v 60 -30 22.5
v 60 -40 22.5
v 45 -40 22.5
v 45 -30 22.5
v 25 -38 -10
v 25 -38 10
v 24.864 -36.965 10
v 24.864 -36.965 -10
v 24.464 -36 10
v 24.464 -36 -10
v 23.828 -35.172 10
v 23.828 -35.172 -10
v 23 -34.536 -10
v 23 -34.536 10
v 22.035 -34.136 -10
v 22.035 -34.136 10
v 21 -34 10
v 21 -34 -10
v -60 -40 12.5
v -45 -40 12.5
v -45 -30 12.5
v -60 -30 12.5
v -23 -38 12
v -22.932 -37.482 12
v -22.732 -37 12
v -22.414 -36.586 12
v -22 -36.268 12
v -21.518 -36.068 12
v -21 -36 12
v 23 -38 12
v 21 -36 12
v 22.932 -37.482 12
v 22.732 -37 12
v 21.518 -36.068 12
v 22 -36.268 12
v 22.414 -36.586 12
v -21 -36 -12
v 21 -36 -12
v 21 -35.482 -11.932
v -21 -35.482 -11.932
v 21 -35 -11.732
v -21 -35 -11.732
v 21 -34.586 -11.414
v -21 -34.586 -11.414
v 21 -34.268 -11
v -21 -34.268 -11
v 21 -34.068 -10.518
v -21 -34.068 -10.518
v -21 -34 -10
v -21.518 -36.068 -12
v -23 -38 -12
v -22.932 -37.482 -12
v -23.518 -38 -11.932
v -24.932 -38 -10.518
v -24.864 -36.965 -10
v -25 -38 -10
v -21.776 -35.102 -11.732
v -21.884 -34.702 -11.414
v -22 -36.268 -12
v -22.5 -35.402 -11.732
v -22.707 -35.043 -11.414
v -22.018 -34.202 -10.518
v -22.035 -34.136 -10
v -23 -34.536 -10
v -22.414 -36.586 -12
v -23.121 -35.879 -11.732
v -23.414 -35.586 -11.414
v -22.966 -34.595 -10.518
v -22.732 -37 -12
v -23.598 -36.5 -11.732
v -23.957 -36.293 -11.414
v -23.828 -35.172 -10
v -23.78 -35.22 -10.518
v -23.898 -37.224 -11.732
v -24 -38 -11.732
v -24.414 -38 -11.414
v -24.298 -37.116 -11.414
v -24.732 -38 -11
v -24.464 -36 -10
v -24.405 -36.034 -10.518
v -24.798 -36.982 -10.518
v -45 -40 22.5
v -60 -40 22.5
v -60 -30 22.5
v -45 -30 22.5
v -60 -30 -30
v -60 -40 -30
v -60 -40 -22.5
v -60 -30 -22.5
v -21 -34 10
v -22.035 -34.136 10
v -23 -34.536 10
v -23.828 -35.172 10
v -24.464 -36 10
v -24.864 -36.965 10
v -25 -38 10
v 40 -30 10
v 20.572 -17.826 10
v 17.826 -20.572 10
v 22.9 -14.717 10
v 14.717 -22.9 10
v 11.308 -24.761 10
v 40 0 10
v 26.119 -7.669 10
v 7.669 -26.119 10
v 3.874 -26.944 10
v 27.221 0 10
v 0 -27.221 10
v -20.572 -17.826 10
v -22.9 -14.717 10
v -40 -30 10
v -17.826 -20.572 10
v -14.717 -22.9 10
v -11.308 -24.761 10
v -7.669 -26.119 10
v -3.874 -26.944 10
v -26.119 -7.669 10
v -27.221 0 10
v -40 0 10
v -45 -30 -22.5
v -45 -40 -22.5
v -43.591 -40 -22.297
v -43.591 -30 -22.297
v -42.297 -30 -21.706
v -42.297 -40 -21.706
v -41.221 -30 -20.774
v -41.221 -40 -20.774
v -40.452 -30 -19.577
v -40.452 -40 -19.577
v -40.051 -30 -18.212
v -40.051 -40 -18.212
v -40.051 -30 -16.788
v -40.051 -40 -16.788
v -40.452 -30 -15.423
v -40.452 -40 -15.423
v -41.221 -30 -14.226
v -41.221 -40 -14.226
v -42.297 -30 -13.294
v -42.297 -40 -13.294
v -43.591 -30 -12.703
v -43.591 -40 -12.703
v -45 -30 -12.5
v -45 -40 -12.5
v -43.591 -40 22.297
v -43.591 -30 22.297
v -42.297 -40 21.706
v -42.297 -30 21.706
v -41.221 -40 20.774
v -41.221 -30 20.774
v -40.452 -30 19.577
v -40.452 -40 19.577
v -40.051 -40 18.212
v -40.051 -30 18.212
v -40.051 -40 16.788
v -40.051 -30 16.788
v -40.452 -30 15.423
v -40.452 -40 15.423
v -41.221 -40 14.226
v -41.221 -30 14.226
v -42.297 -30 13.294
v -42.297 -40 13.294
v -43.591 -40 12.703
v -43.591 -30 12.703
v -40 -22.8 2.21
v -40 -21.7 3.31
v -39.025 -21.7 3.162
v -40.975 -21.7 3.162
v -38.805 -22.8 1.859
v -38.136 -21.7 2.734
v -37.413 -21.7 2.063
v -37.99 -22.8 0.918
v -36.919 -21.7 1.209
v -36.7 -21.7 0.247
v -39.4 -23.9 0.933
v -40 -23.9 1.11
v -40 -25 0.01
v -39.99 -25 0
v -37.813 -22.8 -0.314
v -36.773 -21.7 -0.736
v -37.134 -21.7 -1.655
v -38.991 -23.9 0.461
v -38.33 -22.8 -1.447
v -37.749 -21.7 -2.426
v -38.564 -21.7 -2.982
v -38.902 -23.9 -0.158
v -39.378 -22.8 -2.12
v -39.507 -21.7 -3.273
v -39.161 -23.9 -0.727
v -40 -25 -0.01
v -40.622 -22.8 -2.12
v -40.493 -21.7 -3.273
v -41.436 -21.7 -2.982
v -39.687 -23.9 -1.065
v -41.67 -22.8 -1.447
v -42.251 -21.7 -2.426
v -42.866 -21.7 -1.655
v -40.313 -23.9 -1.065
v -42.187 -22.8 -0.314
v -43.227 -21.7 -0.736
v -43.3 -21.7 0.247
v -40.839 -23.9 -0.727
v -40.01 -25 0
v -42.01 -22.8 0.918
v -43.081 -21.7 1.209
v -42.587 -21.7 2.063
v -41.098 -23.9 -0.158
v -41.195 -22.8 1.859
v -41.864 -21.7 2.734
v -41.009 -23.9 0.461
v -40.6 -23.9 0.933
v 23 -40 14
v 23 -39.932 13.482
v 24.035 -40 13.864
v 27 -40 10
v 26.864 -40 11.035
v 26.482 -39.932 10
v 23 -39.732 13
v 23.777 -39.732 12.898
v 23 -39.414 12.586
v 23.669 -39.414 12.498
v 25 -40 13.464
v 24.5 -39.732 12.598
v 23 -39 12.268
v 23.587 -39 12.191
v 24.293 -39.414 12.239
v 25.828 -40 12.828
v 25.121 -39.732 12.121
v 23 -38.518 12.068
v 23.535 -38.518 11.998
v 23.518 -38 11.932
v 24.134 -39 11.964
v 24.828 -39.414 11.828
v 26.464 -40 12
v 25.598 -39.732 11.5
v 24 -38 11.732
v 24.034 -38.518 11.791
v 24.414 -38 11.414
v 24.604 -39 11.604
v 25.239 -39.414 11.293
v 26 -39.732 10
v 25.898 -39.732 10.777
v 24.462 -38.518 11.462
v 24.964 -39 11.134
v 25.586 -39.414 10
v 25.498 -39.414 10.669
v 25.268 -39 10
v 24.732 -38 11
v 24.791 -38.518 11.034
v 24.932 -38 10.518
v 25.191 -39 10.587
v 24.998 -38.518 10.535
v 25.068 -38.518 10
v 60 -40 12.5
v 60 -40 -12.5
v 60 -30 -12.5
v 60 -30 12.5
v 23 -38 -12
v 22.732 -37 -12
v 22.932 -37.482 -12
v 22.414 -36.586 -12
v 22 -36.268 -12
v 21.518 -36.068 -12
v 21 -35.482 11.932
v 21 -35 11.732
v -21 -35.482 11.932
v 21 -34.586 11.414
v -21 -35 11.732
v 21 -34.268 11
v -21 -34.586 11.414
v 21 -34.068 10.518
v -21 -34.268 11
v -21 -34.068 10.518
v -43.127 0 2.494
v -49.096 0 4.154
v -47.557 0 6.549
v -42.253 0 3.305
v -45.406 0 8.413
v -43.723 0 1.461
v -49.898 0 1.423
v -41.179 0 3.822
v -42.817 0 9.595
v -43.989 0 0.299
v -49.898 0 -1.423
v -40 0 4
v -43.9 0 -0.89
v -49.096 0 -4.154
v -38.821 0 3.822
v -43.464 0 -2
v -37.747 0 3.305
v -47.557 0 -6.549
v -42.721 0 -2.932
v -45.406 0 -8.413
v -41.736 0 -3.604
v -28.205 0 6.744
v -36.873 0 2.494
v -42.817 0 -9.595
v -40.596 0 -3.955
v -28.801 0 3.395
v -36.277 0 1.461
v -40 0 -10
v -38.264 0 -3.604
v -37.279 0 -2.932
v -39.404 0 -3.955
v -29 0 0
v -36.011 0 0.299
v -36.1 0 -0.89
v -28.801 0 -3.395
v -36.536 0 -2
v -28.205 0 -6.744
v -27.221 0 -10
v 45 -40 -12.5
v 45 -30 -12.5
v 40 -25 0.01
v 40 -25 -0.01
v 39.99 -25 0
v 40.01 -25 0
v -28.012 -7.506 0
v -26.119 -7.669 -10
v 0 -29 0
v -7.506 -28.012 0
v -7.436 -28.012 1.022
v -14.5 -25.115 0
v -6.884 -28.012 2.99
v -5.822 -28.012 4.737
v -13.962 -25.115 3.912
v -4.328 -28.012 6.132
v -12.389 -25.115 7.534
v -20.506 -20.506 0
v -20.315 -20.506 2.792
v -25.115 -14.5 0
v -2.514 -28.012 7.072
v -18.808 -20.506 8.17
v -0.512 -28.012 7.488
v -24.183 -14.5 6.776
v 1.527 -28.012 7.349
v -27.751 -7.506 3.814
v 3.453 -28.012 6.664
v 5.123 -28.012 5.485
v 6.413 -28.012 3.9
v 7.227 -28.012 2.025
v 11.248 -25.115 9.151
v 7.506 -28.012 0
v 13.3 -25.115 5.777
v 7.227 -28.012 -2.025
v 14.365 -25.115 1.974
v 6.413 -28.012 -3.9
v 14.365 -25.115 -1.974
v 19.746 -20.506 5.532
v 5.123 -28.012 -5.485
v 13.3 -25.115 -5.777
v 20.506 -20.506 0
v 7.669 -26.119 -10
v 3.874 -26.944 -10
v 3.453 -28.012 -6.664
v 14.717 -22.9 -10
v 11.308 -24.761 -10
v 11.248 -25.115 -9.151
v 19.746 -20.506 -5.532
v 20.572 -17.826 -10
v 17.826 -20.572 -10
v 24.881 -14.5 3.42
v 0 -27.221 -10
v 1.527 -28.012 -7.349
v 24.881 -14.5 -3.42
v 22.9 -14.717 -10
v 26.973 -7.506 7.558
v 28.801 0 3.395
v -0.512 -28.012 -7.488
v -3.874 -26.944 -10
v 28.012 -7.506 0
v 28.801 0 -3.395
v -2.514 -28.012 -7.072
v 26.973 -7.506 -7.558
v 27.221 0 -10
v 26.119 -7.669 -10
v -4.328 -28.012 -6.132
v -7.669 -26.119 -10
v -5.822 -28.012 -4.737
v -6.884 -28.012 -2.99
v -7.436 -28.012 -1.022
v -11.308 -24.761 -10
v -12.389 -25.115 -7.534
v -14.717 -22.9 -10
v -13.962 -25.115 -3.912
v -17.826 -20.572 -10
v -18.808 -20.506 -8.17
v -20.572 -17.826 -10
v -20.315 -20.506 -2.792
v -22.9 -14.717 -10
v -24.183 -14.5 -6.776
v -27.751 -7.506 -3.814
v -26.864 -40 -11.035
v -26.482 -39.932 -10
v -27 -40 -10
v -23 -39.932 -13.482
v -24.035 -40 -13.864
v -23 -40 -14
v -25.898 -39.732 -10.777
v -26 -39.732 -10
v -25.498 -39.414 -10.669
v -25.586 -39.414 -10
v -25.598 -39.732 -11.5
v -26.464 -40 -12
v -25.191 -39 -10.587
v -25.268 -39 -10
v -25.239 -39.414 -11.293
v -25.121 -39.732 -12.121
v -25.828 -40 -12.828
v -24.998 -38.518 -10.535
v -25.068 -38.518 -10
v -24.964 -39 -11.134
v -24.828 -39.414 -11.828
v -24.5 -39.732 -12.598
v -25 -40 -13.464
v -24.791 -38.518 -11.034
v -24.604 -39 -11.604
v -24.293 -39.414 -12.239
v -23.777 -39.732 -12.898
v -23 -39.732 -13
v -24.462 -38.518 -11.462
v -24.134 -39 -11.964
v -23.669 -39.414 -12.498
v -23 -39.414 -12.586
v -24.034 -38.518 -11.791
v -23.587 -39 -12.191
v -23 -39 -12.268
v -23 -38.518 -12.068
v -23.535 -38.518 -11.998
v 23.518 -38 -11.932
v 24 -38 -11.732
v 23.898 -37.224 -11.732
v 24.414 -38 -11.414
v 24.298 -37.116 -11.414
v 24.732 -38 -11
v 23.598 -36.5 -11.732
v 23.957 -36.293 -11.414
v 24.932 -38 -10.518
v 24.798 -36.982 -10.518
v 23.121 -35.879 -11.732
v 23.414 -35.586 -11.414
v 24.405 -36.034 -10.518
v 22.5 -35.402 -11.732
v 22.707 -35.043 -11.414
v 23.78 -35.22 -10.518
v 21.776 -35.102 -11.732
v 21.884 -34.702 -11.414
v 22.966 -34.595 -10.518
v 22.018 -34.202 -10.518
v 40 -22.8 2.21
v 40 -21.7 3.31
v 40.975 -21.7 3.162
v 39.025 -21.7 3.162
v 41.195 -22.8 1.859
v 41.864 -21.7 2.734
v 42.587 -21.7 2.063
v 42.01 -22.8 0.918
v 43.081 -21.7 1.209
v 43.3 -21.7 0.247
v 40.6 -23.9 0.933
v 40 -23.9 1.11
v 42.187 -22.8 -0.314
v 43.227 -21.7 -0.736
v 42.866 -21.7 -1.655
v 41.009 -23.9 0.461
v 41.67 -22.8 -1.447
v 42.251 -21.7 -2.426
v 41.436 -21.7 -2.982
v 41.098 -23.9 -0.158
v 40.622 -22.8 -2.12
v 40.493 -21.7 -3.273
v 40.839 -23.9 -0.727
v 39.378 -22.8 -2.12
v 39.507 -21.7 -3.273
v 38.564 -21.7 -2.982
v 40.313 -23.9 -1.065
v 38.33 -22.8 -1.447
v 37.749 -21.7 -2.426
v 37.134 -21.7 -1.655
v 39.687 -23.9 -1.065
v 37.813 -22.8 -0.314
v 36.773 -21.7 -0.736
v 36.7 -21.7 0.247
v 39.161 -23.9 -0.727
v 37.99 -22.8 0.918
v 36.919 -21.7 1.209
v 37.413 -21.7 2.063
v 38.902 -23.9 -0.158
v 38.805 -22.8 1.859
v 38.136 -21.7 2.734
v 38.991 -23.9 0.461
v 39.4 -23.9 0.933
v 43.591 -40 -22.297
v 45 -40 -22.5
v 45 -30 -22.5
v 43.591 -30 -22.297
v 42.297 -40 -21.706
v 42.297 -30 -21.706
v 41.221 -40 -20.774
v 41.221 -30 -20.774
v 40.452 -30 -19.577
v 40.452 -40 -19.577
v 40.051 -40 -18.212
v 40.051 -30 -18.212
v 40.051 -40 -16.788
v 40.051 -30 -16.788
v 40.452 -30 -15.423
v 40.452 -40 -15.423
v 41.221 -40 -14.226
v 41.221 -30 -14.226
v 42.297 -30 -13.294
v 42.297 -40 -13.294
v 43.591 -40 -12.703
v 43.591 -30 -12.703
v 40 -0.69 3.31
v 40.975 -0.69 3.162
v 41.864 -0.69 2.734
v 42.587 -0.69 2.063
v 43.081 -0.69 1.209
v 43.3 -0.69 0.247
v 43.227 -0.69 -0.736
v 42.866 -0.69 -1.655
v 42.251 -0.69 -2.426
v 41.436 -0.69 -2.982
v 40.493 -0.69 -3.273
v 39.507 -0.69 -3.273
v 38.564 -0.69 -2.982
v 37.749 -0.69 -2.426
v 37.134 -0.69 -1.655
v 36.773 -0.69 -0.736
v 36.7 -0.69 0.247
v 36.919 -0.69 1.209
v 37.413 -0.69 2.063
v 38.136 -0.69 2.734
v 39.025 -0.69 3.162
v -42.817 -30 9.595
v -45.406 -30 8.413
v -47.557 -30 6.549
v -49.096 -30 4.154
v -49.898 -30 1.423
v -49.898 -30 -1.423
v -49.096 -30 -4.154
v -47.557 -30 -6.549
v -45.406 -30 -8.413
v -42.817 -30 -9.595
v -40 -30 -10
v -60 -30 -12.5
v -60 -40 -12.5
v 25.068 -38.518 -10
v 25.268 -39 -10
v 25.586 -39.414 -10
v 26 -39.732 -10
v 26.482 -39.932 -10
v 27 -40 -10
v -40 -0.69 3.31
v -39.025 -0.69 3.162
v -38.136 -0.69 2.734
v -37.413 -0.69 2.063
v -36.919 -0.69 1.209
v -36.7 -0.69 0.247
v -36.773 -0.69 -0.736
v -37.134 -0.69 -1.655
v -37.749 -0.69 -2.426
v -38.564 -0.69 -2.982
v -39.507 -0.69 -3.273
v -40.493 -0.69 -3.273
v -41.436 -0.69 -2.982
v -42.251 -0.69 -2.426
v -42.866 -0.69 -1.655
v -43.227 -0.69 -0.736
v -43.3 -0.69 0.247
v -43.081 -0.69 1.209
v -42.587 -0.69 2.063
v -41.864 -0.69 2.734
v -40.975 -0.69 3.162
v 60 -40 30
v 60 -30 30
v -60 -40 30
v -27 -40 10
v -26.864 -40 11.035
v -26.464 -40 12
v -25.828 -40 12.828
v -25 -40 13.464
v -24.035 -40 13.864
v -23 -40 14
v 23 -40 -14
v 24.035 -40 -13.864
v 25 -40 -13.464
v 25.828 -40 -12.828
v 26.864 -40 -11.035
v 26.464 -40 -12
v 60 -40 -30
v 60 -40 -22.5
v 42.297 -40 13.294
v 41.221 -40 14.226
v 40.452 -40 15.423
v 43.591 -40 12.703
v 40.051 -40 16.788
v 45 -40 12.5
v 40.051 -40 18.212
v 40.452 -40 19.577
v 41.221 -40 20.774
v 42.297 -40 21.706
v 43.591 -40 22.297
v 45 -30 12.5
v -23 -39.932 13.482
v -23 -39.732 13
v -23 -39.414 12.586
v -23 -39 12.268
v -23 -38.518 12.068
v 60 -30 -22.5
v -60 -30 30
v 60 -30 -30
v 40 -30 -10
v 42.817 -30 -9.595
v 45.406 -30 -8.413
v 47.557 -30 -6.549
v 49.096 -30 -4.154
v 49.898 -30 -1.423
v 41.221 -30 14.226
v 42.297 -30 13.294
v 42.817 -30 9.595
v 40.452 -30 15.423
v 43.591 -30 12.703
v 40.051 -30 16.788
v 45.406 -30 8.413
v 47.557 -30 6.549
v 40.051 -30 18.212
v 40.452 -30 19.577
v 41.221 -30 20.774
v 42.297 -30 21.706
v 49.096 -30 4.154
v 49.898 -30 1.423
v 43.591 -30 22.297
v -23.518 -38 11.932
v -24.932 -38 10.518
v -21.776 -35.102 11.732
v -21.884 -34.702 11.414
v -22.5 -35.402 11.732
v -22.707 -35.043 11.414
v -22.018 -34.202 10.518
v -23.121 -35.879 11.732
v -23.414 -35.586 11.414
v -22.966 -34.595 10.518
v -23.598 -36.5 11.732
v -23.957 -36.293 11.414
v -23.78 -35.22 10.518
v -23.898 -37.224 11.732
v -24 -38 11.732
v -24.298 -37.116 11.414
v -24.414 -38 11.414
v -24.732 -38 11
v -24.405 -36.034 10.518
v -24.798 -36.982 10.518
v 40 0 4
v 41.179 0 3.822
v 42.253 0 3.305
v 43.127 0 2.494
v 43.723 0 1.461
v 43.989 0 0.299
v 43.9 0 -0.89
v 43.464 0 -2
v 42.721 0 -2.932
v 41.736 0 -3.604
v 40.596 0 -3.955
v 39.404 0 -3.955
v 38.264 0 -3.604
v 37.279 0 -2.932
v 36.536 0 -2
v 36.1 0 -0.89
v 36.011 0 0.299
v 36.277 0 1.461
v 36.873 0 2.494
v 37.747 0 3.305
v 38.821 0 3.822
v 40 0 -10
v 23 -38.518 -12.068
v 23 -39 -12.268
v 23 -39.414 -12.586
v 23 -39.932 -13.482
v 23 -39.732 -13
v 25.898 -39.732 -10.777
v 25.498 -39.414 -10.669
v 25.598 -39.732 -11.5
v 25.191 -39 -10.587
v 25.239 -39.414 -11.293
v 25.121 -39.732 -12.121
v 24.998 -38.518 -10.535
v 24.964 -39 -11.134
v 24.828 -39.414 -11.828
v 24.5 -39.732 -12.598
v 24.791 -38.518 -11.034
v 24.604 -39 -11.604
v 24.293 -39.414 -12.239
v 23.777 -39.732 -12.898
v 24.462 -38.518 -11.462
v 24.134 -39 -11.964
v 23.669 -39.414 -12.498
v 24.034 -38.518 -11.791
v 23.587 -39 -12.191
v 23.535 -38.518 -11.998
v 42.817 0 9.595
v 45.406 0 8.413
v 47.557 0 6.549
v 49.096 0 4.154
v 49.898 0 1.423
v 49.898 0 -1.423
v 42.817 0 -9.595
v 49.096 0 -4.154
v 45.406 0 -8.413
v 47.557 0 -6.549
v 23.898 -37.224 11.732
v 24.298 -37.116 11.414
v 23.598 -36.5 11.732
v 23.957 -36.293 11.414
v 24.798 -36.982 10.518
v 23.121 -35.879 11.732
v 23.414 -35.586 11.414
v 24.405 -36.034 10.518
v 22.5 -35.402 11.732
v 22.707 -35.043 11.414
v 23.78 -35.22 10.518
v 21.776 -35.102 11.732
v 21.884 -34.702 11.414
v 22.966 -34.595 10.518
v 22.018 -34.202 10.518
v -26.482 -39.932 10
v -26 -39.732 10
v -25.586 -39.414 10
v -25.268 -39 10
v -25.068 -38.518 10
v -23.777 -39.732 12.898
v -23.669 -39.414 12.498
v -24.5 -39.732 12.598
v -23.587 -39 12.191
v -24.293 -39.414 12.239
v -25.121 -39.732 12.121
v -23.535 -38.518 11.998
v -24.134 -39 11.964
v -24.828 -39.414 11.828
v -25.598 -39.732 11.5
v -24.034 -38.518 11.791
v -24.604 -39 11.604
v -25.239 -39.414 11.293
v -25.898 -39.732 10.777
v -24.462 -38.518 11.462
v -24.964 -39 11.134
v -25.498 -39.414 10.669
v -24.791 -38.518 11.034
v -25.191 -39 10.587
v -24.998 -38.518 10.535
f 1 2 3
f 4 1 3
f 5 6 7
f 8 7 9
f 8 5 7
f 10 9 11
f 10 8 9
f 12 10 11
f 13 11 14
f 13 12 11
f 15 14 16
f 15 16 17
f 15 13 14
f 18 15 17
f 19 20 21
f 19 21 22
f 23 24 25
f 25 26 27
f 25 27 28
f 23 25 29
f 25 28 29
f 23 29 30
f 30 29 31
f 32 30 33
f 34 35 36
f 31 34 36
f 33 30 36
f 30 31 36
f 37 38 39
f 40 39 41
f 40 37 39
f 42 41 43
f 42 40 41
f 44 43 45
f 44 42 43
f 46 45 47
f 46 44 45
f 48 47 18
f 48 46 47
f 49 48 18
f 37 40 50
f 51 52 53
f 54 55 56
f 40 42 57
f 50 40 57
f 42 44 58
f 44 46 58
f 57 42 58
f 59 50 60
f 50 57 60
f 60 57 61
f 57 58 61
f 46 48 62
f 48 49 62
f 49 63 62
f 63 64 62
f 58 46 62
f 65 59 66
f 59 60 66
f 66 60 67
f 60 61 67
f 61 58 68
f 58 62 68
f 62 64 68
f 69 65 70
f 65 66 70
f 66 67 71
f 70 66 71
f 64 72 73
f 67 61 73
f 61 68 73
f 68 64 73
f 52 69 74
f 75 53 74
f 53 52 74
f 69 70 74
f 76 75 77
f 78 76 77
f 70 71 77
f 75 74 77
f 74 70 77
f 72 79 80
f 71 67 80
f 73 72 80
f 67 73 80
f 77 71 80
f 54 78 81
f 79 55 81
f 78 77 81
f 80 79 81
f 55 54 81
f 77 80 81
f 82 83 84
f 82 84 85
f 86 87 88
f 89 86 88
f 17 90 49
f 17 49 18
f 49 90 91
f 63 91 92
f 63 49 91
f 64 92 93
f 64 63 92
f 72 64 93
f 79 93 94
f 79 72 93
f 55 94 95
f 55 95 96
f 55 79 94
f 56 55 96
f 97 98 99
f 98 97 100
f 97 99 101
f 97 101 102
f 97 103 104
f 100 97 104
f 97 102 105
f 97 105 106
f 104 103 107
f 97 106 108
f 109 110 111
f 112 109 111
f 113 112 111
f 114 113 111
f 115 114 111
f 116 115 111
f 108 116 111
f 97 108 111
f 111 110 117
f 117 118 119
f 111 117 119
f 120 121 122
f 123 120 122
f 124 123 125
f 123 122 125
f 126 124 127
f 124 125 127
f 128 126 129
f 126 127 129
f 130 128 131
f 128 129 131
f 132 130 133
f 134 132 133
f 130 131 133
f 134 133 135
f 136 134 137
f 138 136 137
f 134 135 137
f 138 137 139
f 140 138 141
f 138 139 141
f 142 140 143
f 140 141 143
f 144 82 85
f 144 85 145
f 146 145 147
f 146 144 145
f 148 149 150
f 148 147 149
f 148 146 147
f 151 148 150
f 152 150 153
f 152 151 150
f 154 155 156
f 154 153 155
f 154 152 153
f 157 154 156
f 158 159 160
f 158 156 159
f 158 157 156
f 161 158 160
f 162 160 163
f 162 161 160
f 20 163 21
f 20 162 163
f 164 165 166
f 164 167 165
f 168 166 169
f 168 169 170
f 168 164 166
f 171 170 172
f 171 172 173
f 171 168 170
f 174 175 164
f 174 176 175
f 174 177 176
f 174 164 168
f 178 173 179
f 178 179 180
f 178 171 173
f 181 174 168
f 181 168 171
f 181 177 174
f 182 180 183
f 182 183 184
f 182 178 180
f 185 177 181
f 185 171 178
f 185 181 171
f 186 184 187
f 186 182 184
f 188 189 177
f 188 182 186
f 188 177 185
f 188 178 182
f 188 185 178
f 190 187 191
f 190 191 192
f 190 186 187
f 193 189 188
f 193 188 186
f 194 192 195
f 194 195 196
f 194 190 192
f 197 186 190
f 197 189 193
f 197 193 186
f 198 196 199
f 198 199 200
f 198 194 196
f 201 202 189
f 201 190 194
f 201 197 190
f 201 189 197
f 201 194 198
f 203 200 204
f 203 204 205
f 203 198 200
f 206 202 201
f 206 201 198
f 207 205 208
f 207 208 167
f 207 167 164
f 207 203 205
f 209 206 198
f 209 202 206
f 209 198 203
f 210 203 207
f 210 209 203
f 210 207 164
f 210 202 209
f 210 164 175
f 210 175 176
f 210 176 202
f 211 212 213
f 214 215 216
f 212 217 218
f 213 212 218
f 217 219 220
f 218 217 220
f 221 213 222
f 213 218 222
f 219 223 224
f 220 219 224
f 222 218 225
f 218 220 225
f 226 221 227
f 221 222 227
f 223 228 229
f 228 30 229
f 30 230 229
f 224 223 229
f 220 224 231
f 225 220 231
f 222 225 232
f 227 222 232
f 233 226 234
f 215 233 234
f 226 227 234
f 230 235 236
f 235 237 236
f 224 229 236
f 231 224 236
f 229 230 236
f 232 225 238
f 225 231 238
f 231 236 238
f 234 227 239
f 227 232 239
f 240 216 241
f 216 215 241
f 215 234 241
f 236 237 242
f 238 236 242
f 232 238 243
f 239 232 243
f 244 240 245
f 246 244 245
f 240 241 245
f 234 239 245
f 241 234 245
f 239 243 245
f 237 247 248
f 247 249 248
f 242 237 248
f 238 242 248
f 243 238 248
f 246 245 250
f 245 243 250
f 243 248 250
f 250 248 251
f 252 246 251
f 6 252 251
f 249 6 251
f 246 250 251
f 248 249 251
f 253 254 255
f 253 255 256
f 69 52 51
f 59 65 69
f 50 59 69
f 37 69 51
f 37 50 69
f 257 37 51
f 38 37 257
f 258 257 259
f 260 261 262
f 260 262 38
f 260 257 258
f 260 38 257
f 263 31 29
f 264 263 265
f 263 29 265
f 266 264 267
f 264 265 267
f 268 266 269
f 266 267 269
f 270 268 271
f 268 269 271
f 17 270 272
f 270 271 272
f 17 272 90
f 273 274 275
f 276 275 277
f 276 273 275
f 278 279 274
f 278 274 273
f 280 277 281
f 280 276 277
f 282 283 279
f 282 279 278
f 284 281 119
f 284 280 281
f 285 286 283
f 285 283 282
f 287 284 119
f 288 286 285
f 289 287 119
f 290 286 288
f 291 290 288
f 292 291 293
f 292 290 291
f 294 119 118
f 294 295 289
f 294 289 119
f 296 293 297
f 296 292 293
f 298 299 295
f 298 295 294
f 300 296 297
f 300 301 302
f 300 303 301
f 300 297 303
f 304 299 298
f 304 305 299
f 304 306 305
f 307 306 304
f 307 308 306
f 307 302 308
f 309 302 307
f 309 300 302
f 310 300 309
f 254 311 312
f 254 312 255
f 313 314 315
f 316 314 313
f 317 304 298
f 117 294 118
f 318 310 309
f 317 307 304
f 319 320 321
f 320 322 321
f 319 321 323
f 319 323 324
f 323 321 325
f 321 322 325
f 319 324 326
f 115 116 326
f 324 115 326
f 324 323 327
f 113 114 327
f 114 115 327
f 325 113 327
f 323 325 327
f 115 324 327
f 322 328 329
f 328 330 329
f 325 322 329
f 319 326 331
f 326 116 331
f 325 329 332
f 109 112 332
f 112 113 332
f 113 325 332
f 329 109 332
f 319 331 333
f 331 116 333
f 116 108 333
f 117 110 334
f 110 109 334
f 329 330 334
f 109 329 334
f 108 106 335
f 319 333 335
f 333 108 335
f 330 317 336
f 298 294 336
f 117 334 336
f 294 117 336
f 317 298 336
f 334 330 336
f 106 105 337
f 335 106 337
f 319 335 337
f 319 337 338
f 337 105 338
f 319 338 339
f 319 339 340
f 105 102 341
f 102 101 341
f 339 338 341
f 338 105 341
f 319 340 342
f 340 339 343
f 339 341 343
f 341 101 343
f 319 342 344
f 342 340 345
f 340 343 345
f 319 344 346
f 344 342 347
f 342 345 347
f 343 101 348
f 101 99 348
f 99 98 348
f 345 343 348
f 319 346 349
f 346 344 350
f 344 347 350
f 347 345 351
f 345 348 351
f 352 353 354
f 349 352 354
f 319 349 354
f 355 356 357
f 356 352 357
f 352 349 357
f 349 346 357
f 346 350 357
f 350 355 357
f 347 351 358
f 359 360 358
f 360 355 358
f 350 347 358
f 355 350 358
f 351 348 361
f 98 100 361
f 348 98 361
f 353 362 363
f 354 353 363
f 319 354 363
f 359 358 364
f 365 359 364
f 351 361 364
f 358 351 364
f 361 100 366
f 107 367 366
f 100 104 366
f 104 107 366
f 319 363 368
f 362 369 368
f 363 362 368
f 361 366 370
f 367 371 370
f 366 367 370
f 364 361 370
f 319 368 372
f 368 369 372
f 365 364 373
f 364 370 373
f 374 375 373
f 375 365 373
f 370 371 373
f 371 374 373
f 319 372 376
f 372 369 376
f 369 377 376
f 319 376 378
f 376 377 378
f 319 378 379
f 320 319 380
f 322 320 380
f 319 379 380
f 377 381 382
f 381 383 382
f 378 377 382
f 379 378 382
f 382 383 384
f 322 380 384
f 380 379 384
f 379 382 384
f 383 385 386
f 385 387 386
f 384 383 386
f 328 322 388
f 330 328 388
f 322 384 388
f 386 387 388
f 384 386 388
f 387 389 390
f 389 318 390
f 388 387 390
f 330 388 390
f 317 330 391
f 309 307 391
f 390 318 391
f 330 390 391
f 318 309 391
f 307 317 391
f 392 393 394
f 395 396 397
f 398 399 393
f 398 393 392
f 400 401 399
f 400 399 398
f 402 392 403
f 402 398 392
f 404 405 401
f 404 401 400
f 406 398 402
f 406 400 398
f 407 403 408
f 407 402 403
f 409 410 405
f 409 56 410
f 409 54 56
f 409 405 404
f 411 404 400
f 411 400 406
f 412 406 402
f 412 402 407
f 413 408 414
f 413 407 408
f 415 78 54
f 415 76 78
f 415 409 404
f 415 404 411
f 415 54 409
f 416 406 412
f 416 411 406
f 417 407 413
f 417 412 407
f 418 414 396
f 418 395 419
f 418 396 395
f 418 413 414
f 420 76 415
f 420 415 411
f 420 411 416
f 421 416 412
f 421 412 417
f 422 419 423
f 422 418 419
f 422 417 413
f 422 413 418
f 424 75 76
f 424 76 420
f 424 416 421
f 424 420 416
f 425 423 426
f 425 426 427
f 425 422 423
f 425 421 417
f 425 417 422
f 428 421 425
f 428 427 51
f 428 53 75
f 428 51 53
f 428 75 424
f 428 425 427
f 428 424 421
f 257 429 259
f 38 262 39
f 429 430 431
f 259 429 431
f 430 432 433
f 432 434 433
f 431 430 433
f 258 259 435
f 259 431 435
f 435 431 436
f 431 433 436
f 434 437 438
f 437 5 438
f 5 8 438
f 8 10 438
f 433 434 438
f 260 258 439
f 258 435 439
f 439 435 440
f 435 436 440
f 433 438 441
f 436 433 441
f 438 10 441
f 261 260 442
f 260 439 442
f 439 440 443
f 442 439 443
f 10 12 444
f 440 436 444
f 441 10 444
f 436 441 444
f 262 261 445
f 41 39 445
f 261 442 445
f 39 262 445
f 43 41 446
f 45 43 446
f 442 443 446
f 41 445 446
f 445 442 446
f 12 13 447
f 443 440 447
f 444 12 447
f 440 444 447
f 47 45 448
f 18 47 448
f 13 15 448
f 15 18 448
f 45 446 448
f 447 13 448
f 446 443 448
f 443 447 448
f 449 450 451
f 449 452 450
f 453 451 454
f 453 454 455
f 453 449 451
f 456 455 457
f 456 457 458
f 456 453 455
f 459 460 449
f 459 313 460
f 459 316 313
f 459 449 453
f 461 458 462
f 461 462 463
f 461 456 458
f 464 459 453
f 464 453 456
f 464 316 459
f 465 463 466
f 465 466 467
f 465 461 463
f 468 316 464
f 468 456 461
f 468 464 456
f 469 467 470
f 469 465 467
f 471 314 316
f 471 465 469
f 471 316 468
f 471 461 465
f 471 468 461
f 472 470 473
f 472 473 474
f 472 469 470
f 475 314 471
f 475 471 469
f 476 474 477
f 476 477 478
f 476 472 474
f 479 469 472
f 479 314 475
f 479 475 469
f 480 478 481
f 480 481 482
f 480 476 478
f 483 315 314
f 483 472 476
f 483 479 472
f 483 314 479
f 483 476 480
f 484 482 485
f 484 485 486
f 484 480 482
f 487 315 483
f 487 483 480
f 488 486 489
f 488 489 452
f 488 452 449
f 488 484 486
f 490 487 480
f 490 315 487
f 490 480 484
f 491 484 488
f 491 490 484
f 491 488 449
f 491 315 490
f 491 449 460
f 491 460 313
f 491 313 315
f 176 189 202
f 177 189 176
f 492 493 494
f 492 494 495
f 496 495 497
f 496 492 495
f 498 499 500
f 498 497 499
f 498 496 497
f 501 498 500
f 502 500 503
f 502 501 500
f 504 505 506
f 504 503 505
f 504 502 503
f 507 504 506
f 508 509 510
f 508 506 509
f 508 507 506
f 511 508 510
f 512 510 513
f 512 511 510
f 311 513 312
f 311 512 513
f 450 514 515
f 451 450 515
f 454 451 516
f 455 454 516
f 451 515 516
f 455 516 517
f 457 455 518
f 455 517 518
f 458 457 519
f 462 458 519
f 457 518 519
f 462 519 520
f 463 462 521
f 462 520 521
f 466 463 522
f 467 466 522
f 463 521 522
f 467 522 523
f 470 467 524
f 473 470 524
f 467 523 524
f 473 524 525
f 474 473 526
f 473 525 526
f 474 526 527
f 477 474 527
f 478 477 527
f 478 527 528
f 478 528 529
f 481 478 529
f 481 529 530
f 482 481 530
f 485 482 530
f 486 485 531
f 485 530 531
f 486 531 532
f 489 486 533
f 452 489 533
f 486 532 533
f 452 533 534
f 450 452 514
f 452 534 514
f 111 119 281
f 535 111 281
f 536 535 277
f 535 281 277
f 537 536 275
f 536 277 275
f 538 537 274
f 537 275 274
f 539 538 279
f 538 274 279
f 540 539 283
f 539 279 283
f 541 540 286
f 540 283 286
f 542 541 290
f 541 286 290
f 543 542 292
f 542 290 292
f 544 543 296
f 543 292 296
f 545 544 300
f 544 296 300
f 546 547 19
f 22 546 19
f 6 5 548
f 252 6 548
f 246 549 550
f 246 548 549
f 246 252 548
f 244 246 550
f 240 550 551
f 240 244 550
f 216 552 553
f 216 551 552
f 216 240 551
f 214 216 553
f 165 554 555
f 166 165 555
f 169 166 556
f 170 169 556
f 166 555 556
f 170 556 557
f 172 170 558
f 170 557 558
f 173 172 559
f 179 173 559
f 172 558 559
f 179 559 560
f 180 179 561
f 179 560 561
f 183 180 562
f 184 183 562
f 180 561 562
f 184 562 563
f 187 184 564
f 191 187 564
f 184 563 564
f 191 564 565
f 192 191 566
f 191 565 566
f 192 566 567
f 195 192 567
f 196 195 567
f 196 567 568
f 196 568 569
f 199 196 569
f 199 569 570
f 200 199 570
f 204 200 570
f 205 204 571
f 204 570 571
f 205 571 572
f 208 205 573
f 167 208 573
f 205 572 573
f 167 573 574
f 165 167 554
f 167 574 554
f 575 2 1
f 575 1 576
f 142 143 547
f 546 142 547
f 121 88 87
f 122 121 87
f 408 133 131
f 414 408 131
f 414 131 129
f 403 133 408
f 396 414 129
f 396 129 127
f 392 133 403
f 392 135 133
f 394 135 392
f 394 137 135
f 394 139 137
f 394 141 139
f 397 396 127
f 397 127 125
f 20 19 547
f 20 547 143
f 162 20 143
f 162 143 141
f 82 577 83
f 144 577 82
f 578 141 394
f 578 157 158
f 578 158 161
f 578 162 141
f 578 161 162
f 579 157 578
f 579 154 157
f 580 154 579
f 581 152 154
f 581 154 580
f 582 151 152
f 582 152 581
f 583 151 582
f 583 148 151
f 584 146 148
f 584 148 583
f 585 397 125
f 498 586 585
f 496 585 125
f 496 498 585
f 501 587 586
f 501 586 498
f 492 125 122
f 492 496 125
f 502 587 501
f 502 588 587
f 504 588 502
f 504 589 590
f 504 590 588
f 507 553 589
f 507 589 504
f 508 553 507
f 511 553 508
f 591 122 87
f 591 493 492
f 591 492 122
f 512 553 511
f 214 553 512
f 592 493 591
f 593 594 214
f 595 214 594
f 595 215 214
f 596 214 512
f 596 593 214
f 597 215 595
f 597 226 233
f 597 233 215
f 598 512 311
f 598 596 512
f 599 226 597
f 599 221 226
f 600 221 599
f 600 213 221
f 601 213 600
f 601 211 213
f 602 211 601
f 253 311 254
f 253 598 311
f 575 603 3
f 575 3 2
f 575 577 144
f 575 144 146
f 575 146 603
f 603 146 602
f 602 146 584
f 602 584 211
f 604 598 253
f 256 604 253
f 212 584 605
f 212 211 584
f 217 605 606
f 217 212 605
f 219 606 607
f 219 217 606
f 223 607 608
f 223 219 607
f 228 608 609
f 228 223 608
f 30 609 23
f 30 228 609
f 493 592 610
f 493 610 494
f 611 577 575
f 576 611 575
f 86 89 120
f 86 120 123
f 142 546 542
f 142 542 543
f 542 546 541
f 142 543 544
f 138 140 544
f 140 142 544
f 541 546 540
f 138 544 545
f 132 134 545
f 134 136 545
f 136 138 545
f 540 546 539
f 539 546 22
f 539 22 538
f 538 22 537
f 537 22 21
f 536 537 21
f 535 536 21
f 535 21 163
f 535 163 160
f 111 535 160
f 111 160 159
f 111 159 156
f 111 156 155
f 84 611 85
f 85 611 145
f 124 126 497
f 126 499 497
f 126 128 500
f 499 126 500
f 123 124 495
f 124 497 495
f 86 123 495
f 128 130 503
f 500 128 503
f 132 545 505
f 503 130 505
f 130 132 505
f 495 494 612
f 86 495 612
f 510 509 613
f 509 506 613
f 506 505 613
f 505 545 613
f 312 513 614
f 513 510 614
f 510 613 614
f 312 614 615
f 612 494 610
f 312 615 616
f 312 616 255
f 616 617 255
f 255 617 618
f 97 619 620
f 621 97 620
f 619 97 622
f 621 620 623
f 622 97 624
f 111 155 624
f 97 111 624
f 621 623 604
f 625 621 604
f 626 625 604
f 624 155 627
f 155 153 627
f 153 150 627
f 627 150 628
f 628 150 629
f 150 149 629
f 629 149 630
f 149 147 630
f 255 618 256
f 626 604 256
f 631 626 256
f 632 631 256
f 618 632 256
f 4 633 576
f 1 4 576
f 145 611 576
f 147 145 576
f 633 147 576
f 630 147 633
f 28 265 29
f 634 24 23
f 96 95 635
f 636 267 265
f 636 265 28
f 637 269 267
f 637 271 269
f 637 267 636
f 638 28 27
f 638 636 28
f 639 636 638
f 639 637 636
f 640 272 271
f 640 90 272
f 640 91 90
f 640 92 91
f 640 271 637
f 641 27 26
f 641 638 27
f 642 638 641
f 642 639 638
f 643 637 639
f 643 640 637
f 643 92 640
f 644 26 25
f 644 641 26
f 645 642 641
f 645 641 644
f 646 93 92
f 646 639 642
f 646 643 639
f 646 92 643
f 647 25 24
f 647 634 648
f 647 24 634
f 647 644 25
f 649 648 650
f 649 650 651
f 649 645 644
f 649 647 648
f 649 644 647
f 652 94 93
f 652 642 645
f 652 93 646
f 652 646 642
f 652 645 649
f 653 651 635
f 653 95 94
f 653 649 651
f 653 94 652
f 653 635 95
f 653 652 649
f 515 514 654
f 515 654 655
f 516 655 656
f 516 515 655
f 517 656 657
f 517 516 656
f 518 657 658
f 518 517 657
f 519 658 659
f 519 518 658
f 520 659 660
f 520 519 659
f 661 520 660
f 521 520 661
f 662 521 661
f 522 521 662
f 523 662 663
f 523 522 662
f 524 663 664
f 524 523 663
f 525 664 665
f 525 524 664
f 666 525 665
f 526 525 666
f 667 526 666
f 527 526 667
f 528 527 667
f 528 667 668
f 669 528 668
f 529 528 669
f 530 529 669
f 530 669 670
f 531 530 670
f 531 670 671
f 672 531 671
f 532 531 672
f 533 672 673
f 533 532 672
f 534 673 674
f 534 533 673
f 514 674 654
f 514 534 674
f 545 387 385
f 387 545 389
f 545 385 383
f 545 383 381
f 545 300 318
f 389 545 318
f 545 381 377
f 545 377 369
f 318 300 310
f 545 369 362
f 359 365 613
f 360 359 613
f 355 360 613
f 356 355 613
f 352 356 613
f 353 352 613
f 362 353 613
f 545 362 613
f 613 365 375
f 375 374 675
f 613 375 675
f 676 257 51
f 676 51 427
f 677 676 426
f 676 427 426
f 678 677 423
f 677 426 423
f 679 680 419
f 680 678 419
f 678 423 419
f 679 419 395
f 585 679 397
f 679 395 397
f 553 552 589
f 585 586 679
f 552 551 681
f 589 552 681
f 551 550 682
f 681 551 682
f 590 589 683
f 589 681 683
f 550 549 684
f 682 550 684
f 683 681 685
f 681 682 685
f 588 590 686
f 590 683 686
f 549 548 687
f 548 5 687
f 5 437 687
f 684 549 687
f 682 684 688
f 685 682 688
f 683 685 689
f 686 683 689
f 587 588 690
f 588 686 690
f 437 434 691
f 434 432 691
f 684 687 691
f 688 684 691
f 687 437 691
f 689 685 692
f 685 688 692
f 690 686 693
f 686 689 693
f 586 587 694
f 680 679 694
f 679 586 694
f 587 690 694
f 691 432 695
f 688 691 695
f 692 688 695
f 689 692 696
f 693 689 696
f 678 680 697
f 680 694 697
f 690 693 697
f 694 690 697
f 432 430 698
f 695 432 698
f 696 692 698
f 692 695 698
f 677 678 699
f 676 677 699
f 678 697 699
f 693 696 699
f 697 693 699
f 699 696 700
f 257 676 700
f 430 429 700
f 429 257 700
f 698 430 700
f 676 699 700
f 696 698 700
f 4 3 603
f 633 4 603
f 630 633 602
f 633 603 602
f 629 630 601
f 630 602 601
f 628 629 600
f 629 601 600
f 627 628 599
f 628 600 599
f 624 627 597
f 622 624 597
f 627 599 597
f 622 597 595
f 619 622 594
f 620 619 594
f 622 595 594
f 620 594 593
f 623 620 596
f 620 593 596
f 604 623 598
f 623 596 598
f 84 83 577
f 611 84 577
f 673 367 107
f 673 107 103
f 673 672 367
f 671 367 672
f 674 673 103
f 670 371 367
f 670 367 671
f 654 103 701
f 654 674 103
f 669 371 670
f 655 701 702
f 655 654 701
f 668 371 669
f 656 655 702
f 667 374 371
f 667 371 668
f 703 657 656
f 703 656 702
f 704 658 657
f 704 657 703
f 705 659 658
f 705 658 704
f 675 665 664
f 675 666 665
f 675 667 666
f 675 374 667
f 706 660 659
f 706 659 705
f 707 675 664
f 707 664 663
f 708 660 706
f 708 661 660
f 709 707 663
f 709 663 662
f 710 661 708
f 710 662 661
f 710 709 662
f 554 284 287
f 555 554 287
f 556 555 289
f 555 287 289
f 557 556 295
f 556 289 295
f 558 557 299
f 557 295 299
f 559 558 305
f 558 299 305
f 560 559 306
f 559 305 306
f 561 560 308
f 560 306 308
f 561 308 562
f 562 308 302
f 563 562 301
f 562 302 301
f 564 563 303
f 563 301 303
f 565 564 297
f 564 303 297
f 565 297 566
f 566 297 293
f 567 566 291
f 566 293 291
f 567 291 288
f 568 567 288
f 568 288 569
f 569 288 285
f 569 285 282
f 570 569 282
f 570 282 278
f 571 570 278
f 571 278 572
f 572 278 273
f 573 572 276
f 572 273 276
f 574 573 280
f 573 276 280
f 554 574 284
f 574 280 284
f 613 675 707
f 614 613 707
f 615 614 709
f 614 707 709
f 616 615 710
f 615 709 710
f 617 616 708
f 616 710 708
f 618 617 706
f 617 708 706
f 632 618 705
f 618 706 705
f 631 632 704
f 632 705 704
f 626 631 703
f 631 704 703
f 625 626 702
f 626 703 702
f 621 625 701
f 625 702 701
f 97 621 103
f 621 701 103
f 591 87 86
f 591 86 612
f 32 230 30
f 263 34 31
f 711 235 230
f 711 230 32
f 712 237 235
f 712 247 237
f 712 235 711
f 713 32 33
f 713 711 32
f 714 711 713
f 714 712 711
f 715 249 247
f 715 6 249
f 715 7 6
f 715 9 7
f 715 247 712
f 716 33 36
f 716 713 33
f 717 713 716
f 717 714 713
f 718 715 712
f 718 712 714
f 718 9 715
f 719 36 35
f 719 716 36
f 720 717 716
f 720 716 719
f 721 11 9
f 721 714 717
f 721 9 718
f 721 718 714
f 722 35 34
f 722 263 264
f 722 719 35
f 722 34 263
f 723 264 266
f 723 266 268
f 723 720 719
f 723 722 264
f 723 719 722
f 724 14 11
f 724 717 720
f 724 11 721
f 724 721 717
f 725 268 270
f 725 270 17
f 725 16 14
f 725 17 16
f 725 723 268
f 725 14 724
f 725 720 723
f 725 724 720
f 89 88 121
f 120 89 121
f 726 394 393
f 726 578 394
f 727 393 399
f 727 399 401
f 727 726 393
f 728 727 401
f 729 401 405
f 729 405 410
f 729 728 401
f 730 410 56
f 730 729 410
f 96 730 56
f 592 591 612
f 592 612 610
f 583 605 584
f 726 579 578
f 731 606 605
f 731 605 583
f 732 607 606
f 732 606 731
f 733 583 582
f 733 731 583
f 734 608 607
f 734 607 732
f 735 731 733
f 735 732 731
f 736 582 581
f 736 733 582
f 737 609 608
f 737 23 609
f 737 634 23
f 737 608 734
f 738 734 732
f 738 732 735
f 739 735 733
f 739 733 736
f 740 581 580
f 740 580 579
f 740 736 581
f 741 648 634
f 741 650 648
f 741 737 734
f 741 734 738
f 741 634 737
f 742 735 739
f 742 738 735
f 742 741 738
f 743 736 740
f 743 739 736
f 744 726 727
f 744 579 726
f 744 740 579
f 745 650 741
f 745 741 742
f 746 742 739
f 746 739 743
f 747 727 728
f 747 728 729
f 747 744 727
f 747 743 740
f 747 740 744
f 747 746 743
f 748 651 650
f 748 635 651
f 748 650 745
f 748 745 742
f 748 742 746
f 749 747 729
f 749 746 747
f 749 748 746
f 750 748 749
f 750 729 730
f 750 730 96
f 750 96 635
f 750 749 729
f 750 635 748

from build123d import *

# Parameters (mm, degrees)
EXTRUDE_2_DEPTH          = 19
EXTRUDE_5_DEPTH          = 40
CUT_EXTRUDE_START        = -10
SKETCH_1_4_R             = 24
CUT_EXTRUDE_1_DEPTH      = 20
SKETCH_4_W               = 120
SKETCH_4_H               = 60
EXTRUDE_6_DEPTH          = 10
FILLET_2_R               = 5
CUT_EXTRUDE_2_DEPTH      = 79.102496759
MIRROR_2_COPY_1_DEPTH    = 79.102496759
CUT_EXTRUDE_3_DEPTH      = 12
SKETCH_6_W               = 25
SKETCH_6_H               = 6
CUT_EXTRUDE_4_DEPTH      = 12
FILLET_3_R               = 4
FILLET_4_R               = 2
SKETCH_7_R               = 3.3095
CUT_EXTRUDE_5_DEPTH      = 25
CHAMFER_1_SIZE           = 3.3
CHAMFER_2_SIZE           = 0.6905
SKETCH_11_W              = 120
SKETCH_11_H              = 68
CUT_EXTRUDE_8_DEPTH      = 80.724525712
CUT_EXTRUDE_9_DEPTH      = 90.493016487
CUT_EXTRUDE_9_DEPTH_BACK = 9
SKETCH_12_W              = 80
SKETCH_12_H              = 30
SKETCH_13_W              = 80
SKETCH_13_H              = 30
CUT_EXTRUDE_10_DEPTH     = 83.462112512


with BuildPart() as part:
    # Эскиз1 → Бобышка-Вытянуть2 (new, symmetric)
    with BuildSketch(Plane.XY):
        with BuildLine():
            Line((35, 0), (26, 0))
            ThreePointArc((26, 0), (0, -26), (-26, 0))
            Line((-26, 0), (-35, 0))
            ThreePointArc((-35, 0), (0, -35), (35, 0))
        make_face()
        with BuildLine():
            Line((26, 0), (24, 0))
            ThreePointArc((24, 0), (0, -24), (-24, 0))
            Line((-24, 0), (-26, 0))
            ThreePointArc((-26, 0), (0, -26), (26, 0))
        make_face()
    extrude(amount=EXTRUDE_2_DEPTH, both=True)

    # Эскиз2 → Бобышка-Вытянуть5 (add)
    with BuildSketch(Plane(origin=(0, 0, 0), x_dir=(1, 0, 0), z_dir=(0, 1, 0))):
        with BuildLine():
            Line((-40, 10), (40, 10))
            ThreePointArc((40, 10), (50, 0), (40, -10))
            Line((40, -10), (-40, -10))
            ThreePointArc((-40, -10), (-50, 0), (-40, 10))
        make_face()
    extrude(amount=-EXTRUDE_5_DEPTH)

    # Эскиз1<4> → Вырез-Вытянуть1 (cut)
    with BuildSketch(Plane.XY.offset(CUT_EXTRUDE_START)):
        Circle(SKETCH_1_4_R)
    extrude(amount=CUT_EXTRUDE_1_DEPTH, mode=Mode.SUBTRACT)

    # Эскиз4 → Бобышка-Вытянуть6 (add)
    with BuildSketch(Plane.XZ.offset(40)):
        Rectangle(SKETCH_4_W, SKETCH_4_H)
    extrude(amount=-EXTRUDE_6_DEPTH)

    # Скругление2
    fillet_2_edges = [part.edges().sort_by_distance(p)[0] for p in [
        (-18.027756377, -30, 14.5),
        (18.027756377, -30, 14.5),
        (18.027756377, -30, -14.5),
        (-18.027756377, -30, -14.5),
    ]]
    fillet(fillet_2_edges, radius=FILLET_2_R)

    # Эскиз5 → Вырез-Вытянуть2 (cut, through all)
    with BuildSketch(Plane.XZ.offset(40)):
        with BuildLine():
            Line((75, -22.5), (45, -22.5))
            ThreePointArc((45, -22.5), (40, -17.5), (45, -12.5))
            Line((45, -12.5), (75, -12.5))
            ThreePointArc((75, -12.5), (80, -17.5), (75, -22.5))
        make_face()
    cut_extrude_2 = extrude(amount=-CUT_EXTRUDE_2_DEPTH, mode=Mode.SUBTRACT)

    # Зеркальное отражение1: Вырез-Вытянуть2 across plane
    add(cut_extrude_2.mirror(Plane.XY), mode=Mode.SUBTRACT)

    # Зеркальное отражение2: Вырез-Вытянуть2 across plane
    add(cut_extrude_2.mirror(Plane(origin=(0, 0, 0), x_dir=(0, 0, 1), z_dir=(1, 0, 0))), mode=Mode.SUBTRACT)

    # Зеркальное отражение2 copy 1 sketch → Зеркальное отражение2 copy 1 (cut, through all)
    with BuildSketch(Plane(origin=(0, -40, 0), x_dir=(-1, 0, 0), z_dir=(0, -1, 0))):
        with BuildLine():
            Line((75, -22.5), (45, -22.5))
            ThreePointArc((45, -22.5), (40, -17.5), (45, -12.5))
            Line((45, -12.5), (75, -12.5))
            ThreePointArc((75, -12.5), (80, -17.5), (75, -22.5))
        make_face()
    extrude(amount=-MIRROR_2_COPY_1_DEPTH, mode=Mode.SUBTRACT)

    # Эскиз1<5> → Вырез-Вытянуть3 (cut, symmetric)
    with BuildSketch(Plane.XY):
        with BuildLine():
            ThreePointArc((-24, 0), (0, 24), (24, 0))
            Line((24, 0), (26, 0))
            ThreePointArc((26, 0), (0, 26), (-26, 0))
            Line((-26, 0), (-24, 0))
        make_face()
        with BuildLine():
            Line((26, 0), (24, 0))
            ThreePointArc((24, 0), (0, -24), (-24, 0))
            Line((-24, 0), (-26, 0))
            ThreePointArc((-26, 0), (0, -26), (26, 0))
        make_face()
    extrude(amount=CUT_EXTRUDE_3_DEPTH, both=True, mode=Mode.SUBTRACT)

    # Эскиз6 → Вырез-Вытянуть4 (cut, symmetric)
    with BuildSketch(Plane.XY):
        with Locations((12.5, -37)):
            Rectangle(SKETCH_6_W, SKETCH_6_H)
    cut_extrude_4 = extrude(amount=CUT_EXTRUDE_4_DEPTH, both=True, mode=Mode.SUBTRACT)

    # Зеркальное отражение3: Вырез-Вытянуть4 across plane
    add(cut_extrude_4.mirror(Plane(origin=(0, -34, -12), x_dir=(0, 0, 1), z_dir=(-1, 0, 0))), mode=Mode.SUBTRACT)

    # Скругление3
    fillet_3_edges = [part.edges().sort_by_distance(p)[0] for p in [
        (25, -34, 0),
        (-25, -34, 0),
    ]]
    fillet(fillet_3_edges, radius=FILLET_3_R)

    # Скругление4
    fillet_4_edges = [part.edges().sort_by_distance(p)[0] for p in [
        (-23.828427125, -35.171572875, 12),
        (23.828427125, -35.171572875, 12),
        (-23.828427125, -35.171572875, -12),
        (23.828427125, -35.171572875, -12),
        (0, -34, 12),
        (0, -34, -12),
        (0, -40, 12),
        (-25, -40, 0),
        (25, -40, 0),
        (0, -40, -12),
    ]]
    fillet(fillet_4_edges, radius=FILLET_4_R - 0.0001)  # a hair under: the kernel refuses the full size

    # Эскиз7 → Вырез-Вытянуть5 (cut)
    with BuildSketch(Plane(origin=(0, 0, 0), x_dir=(1, 0, 0), z_dir=(0, 1, 0))):
        with Locations(Location((-40, 0, 0), (0, 0, 270))):
            Circle(SKETCH_7_R)
        with Locations(Location((40, 0, 0), (0, 0, 270))):
            Circle(SKETCH_7_R)
    extrude(amount=-CUT_EXTRUDE_5_DEPTH, mode=Mode.SUBTRACT)

    # Фаска1
    chamfer_1_edges = [part.edges().sort_by_distance(p)[0] for p in [
        (-40, -25, -3.3095),
        (40, -25, -3.3095),
    ]]
    chamfer(chamfer_1_edges, length=CHAMFER_1_SIZE)

    # Фаска2
    chamfer_2_edges = [part.edges().sort_by_distance(p)[0] for p in [
        (-40, 0, -3.3095),
        (40, 0, -3.3095),
    ]]
    chamfer(chamfer_2_edges, length=CHAMFER_2_SIZE)

    # Эскиз8 → Повернуть1 (revolve)
    with BuildSketch(Plane.XY):
        with BuildLine():
            Line((0, 34), (0, -34))
            ThreePointArc((0, -34), (-34, 0), (0, 34))
        make_face()
    revolve(axis=Axis((0, 0, 0), (0, 1, 0)))

    # Эскиз9 → Вырез-Повернуть1 (revolve, cut)
    with BuildSketch(Plane.XY):
        with BuildLine():
            Line((0, 29), (0, -29))
            ThreePointArc((0, -29), (-29, 0), (0, 29))
        make_face()
    revolve(axis=Axis((0, 0, 0), (0, 1, 0)), mode=Mode.SUBTRACT)

    # Эскиз11 → Вырез-Вытянуть8 (cut, through all)
    with BuildSketch(Plane(origin=(0, 0, 0), x_dir=(1, 0, 0), z_dir=(0, 1, 0))):
        Rectangle(SKETCH_11_W, SKETCH_11_H)
    extrude(amount=CUT_EXTRUDE_8_DEPTH, mode=Mode.SUBTRACT)

    # Эскиз12 → Вырез-Вытянуть9 (cut, two sides: drawn at the far end of the back side and taken through both)
    with BuildSketch(Plane.XY.offset(19).offset(-CUT_EXTRUDE_9_DEPTH_BACK)):
        with Locations((0, -15)):
            Rectangle(SKETCH_12_W, SKETCH_12_H)
    extrude(amount=CUT_EXTRUDE_9_DEPTH + CUT_EXTRUDE_9_DEPTH_BACK, mode=Mode.SUBTRACT)

    # Эскиз13 → Вырез-Вытянуть10 (cut, through all)
    with BuildSketch(Plane(origin=(0, 0, -10), x_dir=(-1, 0, 0), z_dir=(0, 0, -1))):
        with Locations((0, -15)):
            Rectangle(SKETCH_13_W, SKETCH_13_H)
    extrude(amount=CUT_EXTRUDE_10_DEPTH, mode=Mode.SUBTRACT)


solid = part.part
